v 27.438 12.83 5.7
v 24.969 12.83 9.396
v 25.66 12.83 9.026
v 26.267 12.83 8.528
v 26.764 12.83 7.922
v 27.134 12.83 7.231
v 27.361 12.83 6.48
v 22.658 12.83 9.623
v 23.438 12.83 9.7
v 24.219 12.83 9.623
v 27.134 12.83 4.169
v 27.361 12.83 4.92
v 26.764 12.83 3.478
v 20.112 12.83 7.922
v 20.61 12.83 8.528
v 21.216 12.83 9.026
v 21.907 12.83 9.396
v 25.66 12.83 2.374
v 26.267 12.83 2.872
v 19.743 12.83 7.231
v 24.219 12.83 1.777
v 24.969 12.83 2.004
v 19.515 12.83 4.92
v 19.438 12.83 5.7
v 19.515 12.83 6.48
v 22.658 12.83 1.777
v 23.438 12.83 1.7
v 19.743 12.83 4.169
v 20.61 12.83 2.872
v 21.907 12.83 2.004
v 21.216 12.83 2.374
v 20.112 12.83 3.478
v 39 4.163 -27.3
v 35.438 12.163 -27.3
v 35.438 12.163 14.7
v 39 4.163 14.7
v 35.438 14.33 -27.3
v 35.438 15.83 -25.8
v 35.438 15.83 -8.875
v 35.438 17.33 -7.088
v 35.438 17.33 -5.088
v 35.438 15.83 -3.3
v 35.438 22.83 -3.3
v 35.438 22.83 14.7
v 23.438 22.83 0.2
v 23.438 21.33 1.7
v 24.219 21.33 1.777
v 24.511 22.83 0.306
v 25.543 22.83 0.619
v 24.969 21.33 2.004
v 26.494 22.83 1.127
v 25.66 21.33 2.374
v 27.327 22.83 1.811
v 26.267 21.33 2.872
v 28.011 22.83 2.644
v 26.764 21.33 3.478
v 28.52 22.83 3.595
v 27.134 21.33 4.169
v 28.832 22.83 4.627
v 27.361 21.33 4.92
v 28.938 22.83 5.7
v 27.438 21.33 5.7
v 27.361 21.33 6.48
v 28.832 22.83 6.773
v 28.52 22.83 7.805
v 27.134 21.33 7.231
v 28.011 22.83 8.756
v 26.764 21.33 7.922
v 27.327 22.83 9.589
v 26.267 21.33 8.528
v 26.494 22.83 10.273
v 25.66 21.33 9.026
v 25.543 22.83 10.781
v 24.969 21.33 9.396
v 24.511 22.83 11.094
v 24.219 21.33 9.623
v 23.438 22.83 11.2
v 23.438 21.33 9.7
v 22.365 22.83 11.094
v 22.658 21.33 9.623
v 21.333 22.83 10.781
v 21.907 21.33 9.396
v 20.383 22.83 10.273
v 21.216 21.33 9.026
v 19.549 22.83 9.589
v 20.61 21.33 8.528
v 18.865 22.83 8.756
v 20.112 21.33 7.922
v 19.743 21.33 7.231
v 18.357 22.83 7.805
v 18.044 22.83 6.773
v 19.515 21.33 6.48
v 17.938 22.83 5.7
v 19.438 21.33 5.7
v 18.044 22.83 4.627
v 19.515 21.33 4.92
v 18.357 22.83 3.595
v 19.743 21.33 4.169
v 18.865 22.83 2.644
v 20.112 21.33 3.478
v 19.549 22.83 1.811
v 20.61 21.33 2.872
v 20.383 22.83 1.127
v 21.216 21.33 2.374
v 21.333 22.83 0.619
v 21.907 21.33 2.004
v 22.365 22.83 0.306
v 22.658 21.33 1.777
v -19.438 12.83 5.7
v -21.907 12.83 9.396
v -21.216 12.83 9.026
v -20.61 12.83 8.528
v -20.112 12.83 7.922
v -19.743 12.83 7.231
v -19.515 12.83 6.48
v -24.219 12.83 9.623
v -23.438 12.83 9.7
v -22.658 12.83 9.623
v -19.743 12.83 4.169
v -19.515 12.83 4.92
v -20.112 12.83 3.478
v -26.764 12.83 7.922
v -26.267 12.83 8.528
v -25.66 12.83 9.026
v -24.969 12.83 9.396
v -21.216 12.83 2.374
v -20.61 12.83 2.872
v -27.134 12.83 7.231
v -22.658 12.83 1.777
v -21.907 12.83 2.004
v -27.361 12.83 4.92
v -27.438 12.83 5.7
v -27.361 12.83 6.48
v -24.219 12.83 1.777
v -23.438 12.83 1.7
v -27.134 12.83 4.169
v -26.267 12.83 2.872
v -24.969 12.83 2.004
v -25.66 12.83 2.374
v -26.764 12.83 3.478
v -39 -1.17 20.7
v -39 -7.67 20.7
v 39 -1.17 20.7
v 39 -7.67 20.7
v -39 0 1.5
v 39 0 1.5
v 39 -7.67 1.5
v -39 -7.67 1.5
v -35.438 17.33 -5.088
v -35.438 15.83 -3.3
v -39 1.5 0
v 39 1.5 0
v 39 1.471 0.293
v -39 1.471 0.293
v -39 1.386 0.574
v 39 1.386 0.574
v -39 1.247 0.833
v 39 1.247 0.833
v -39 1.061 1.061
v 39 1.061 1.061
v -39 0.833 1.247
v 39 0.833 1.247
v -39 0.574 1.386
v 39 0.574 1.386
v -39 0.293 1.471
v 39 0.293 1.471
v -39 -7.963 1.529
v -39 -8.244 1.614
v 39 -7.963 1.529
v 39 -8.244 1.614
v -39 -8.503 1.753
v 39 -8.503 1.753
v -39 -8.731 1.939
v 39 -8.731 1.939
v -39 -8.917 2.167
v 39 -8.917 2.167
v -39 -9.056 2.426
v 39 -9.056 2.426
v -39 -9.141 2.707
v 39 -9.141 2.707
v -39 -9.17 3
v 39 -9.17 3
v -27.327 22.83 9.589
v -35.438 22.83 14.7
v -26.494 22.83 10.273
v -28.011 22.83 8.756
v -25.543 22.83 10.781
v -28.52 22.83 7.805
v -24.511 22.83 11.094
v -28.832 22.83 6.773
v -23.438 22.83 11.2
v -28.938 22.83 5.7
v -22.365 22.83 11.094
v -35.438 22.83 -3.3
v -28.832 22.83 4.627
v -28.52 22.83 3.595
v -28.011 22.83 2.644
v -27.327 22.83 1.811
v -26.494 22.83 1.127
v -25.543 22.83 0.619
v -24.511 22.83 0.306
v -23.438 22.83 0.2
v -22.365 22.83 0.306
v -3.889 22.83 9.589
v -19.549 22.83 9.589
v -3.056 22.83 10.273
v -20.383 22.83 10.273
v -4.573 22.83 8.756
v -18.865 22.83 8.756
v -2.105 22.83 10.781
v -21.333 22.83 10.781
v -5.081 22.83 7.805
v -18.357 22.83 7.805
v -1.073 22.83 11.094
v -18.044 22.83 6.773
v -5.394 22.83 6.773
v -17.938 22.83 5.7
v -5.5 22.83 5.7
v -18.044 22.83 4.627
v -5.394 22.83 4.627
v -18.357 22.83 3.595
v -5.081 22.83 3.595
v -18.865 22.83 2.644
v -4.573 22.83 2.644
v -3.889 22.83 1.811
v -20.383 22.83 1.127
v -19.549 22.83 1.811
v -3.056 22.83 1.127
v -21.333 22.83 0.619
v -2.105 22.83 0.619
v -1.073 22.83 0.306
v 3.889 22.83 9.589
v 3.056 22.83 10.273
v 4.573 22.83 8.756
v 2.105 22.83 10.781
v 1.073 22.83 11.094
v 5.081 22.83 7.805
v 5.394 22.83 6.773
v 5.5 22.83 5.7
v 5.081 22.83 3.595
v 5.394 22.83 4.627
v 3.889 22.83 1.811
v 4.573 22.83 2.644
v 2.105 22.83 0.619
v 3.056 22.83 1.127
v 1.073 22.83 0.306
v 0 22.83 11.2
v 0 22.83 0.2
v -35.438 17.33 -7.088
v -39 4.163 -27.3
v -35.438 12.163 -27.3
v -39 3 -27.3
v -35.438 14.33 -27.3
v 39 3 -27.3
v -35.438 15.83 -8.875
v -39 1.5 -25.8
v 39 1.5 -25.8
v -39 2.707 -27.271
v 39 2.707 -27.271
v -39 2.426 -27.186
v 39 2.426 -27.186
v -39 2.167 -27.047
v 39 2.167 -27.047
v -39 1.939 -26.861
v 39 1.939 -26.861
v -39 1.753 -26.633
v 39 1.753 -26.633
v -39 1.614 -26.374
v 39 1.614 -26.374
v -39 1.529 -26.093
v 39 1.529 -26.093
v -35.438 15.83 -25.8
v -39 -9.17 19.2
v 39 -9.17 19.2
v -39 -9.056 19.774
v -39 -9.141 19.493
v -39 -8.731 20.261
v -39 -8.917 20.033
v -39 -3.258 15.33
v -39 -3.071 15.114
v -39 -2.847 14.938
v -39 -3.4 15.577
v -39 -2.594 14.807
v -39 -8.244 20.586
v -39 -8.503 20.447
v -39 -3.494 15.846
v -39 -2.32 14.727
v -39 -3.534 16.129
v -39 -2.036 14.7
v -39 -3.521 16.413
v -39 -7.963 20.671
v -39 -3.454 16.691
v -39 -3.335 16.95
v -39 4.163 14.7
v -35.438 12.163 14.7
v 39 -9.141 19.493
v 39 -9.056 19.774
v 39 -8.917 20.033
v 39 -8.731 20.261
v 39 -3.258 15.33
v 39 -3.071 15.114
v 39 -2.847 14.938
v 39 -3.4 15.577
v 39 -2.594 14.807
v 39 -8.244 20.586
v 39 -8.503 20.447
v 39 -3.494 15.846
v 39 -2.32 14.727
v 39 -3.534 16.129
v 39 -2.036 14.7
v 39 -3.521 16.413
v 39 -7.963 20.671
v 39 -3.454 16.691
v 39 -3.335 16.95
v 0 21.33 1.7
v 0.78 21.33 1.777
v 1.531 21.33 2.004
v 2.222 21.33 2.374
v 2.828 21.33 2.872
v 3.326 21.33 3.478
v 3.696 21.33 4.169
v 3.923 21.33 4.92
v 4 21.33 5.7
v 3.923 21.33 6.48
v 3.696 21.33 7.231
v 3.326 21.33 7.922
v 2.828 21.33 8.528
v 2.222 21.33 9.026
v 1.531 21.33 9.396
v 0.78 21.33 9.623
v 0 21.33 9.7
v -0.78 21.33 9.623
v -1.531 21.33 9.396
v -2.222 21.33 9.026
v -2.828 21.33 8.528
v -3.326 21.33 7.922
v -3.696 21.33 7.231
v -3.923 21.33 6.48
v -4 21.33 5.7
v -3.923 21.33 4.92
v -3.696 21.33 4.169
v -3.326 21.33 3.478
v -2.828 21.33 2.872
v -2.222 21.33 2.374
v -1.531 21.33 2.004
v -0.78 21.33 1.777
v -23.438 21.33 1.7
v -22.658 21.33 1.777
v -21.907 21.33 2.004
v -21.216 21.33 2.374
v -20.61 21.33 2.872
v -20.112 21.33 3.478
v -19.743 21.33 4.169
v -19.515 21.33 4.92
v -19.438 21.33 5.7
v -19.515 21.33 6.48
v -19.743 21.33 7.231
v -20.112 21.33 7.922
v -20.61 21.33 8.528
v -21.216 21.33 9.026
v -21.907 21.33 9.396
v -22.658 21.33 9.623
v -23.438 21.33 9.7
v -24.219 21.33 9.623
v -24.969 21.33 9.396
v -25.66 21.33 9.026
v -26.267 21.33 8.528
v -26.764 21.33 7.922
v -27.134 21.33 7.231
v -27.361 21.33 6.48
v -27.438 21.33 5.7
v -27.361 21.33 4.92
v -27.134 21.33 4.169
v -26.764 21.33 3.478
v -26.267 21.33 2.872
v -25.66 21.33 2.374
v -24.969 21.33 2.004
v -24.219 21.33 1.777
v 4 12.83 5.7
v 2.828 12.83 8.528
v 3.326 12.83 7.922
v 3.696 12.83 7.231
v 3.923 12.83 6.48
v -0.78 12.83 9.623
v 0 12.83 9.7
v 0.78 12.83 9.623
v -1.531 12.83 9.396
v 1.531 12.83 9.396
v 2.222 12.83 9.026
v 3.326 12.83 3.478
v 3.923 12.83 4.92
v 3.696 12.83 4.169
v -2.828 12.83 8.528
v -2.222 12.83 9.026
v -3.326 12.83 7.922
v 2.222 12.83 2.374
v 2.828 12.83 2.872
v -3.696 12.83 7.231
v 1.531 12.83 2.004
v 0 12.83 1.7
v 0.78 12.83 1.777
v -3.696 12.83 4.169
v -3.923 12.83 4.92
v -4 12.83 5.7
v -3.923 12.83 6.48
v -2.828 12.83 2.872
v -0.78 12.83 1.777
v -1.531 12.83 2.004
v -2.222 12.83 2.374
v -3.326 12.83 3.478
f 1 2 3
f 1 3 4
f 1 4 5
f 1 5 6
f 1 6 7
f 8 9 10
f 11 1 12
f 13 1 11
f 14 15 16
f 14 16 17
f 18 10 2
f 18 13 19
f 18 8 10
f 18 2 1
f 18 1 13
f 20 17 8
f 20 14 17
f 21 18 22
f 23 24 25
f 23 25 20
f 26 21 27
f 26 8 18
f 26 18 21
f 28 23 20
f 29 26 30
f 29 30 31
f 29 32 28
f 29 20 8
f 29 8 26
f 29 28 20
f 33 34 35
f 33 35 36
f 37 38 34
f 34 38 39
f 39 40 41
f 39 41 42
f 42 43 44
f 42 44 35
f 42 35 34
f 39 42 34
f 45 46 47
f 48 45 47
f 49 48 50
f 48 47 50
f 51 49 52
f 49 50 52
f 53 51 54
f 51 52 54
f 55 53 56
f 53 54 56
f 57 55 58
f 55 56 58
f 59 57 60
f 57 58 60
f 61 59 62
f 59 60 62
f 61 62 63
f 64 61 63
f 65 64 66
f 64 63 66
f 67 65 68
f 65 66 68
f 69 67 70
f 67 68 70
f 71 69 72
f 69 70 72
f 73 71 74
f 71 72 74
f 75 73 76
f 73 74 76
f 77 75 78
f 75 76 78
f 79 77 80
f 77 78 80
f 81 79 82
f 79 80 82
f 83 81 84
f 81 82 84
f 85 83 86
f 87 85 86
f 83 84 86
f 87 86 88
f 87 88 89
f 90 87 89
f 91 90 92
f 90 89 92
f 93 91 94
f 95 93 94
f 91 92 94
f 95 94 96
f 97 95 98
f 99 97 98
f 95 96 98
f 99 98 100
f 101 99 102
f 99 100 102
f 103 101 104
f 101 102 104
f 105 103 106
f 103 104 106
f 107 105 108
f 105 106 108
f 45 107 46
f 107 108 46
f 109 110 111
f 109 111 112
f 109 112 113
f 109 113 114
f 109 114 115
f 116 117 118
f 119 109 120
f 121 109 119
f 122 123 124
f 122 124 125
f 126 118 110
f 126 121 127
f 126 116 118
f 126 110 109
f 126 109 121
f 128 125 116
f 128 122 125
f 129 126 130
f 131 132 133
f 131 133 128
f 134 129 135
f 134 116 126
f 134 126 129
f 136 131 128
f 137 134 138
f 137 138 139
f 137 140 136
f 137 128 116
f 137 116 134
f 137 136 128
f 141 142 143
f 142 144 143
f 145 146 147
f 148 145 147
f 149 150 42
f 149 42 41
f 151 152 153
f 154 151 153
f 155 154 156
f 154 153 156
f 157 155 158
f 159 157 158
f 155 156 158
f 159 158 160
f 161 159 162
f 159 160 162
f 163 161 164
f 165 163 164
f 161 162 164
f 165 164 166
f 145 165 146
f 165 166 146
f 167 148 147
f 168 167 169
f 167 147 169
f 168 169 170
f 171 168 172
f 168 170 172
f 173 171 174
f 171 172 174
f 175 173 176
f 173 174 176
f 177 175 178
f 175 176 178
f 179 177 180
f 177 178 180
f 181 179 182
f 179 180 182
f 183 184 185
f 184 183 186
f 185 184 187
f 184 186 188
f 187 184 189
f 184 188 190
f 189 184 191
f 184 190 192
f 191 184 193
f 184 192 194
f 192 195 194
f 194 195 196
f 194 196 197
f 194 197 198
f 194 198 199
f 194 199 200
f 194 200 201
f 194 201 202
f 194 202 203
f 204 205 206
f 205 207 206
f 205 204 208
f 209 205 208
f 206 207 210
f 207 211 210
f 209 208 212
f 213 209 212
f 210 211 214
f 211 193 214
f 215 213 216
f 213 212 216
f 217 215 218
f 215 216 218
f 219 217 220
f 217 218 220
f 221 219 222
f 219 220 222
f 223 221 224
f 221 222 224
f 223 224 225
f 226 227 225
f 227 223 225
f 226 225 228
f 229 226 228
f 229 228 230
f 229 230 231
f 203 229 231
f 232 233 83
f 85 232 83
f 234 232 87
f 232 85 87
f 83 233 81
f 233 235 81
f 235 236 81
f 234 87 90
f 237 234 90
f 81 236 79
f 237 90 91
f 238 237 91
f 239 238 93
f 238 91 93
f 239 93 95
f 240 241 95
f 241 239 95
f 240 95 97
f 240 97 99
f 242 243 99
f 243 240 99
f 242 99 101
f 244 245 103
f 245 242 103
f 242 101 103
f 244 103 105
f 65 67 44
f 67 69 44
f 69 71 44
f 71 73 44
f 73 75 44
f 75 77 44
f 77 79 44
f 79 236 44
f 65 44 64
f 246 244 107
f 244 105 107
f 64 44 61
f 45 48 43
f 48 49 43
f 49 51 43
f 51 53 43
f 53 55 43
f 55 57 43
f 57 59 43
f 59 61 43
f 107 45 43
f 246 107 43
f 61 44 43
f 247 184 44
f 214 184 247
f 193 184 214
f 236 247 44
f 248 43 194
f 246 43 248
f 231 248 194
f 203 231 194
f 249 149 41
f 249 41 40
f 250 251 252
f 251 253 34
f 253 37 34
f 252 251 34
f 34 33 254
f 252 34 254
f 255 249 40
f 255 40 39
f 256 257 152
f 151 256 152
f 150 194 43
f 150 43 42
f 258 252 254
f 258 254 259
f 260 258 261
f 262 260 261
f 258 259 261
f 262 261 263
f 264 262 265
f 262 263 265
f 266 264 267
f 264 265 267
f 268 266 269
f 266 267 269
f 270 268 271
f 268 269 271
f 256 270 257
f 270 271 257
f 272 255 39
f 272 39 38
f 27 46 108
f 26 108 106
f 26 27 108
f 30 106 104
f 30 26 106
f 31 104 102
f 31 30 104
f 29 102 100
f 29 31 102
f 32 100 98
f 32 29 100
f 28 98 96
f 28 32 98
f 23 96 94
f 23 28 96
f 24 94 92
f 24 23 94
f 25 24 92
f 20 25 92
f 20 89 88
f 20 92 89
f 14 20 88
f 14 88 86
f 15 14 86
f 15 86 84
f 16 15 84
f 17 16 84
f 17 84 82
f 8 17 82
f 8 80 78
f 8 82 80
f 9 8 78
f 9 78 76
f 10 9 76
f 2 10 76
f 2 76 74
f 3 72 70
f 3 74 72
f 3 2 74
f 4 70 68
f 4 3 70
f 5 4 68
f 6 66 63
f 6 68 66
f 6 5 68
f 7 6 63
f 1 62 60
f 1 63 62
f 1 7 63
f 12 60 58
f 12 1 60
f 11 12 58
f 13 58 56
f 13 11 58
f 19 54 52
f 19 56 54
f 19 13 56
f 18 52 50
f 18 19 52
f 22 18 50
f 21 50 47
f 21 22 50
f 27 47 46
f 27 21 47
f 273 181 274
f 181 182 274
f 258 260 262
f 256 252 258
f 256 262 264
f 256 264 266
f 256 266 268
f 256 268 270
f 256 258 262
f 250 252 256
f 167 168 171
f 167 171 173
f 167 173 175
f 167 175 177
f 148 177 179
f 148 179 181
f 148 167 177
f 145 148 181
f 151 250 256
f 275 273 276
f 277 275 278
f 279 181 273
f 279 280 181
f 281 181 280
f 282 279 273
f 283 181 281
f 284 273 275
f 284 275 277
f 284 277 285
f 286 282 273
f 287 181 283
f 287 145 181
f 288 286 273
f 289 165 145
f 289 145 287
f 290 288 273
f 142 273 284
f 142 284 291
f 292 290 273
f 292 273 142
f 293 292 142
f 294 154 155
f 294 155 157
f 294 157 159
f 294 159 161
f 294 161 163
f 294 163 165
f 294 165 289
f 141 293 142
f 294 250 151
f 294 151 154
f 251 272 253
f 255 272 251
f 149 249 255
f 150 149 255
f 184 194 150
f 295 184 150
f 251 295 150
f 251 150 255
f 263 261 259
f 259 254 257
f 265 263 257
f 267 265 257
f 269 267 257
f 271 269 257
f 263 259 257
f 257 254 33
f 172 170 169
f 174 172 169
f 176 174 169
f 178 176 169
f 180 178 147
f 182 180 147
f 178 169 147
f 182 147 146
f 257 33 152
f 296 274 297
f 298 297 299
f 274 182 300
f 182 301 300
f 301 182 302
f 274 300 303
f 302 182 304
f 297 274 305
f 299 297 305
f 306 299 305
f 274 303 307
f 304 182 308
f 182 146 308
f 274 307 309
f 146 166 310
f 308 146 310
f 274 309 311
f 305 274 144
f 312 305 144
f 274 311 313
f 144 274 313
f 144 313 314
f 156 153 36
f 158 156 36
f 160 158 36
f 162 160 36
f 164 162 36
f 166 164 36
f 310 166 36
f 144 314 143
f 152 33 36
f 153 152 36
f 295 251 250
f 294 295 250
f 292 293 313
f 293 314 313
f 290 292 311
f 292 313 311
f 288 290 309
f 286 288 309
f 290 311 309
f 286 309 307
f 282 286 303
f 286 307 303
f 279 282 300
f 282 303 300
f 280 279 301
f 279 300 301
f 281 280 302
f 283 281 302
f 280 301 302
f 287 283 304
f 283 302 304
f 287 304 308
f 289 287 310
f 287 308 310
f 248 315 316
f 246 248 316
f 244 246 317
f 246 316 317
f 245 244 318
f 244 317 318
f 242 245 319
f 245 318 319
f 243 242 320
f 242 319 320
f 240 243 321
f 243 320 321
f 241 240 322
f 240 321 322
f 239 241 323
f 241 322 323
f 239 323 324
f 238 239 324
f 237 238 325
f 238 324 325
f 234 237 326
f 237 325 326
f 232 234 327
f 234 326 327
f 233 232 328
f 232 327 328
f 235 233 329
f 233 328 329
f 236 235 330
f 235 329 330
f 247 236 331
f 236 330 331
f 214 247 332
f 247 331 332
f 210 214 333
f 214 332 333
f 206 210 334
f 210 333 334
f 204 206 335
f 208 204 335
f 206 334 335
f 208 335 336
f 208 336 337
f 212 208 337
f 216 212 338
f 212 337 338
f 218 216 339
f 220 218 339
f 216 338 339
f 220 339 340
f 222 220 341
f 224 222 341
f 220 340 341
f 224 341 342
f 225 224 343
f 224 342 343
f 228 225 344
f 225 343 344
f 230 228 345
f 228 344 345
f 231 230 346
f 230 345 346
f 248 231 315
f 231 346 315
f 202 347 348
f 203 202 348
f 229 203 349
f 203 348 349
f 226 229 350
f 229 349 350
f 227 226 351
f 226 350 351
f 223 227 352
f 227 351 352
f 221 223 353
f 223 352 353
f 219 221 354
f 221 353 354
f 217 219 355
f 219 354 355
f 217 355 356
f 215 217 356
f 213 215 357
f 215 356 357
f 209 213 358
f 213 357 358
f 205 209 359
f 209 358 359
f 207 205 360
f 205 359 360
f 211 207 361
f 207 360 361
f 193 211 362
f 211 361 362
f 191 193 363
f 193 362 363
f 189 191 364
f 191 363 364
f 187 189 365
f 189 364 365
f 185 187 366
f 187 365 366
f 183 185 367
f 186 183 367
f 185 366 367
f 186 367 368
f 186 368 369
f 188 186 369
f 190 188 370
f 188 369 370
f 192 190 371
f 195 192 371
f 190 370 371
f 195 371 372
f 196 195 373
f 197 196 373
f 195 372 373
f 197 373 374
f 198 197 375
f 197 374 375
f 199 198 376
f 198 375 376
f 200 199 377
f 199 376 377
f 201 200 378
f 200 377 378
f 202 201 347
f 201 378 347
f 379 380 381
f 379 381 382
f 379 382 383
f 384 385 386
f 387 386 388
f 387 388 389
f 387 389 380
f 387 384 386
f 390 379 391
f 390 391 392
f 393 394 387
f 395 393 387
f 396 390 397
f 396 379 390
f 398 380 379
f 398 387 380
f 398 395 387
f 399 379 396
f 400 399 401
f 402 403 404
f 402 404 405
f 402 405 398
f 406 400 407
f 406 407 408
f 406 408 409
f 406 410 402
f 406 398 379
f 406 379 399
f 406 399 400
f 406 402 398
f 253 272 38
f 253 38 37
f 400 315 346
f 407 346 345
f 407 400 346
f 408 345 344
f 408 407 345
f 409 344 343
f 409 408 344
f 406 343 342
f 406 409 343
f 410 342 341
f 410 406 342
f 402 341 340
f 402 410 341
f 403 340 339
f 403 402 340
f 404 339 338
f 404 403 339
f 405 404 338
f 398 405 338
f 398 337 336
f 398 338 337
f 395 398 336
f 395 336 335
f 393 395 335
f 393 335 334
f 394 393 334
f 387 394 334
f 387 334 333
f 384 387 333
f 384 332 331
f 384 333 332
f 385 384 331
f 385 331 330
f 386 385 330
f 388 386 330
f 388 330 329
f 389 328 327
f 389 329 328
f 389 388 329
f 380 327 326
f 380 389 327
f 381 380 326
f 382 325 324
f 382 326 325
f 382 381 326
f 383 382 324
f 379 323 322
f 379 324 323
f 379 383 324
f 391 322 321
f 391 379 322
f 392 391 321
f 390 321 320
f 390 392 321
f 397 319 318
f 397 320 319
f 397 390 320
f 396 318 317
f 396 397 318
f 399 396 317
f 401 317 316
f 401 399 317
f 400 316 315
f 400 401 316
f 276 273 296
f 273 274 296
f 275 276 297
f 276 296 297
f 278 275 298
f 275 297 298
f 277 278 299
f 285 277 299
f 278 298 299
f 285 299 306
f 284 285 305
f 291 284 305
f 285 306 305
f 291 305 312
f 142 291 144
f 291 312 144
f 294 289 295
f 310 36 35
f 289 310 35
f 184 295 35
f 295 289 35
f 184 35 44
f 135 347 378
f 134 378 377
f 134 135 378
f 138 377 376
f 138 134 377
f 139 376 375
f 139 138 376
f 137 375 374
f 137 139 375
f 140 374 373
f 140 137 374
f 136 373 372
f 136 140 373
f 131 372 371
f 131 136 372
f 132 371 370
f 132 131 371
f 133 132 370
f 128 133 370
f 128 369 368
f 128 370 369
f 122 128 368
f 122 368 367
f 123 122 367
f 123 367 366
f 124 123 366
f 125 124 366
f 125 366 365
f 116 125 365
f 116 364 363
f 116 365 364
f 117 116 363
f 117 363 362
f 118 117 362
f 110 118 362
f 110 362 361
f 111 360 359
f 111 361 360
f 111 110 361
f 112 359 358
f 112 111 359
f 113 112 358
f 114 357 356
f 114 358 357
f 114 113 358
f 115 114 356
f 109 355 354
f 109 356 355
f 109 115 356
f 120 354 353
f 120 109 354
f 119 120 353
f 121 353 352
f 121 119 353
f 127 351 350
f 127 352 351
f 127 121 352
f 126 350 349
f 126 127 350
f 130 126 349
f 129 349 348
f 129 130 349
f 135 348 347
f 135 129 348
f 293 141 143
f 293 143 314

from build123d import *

# Parameters (mm, degrees)
BOSS_EXTRUDE1_DEPTH     = 39
CUT_EXTRUDE1_DEPTH      = 53.796769788
CUT_EXTRUDE2_DEPTH      = 58.361049502
CUT_EXTRUDE2_DEPTH_BACK = 10
SKETCH3_R               = 4
CHAMFER1_SIZE           = 1.5


with BuildPart() as part:
    # Sketch1 → Boss-Extrude1 (new, symmetric)
    with BuildSketch(Plane(origin=(0, 0, 0), x_dir=(0, 0, -1), z_dir=(1, 0, 0))):
        with BuildLine():
            Line((-1.5, 0), (-1.5, -7.67))
            ThreePointArc((-1.5, -7.67), (-1.939339828, -8.730660172), (-3, -9.17))
            Line((-3, -9.17), (-19.2, -9.17))
            ThreePointArc((-19.2, -9.17), (-20.260660172, -8.730660172), (-20.7, -7.67))
            Line((-20.7, -7.67), (-20.7, -1.17))
            Line((-20.7, -1.17), (-16.95, -3.335063509))
            ThreePointArc((-16.95, -3.335063509), (-15.45, -3.335063509), (-14.7, -2.036025404))
            Line((-14.7, -2.036025404), (-14.7, 22.83))
            Line((-14.7, 22.83), (3.3, 22.83))
            Line((3.3, 22.83), (3.3, 15.83))
            Line((3.3, 15.83), (5.087630389, 17.33))
            Line((5.087630389, 17.33), (7.087630389, 17.33))
            Line((7.087630389, 17.33), (8.875260778, 15.83))
            Line((8.875260778, 15.83), (25.8, 15.83))
            Line((25.8, 15.83), (27.3, 14.33))
            Line((27.3, 14.33), (27.3, 3))
            ThreePointArc((27.3, 3), (26.860660172, 1.939339828), (25.8, 1.5))
            Line((25.8, 1.5), (0, 1.5))
            ThreePointArc((0, 1.5), (-1.060660172, 1.060660172), (-1.5, 0))
        make_face()
    extrude(amount=BOSS_EXTRUDE1_DEPTH, both=True)

    # Sketch2 → Cut-Extrude1 (cut, symmetric)
    with BuildSketch(Plane.XY):
        Polygon((-39, 22.83), (-35.438170518, 22.83), (-35.438170518, 12.163333333), (-39, 4.163333333), align=None)
    cut_extrude1 = extrude(amount=CUT_EXTRUDE1_DEPTH, both=True, mode=Mode.SUBTRACT)

    # Mirror2: Cut-Extrude1 across plane
    add(cut_extrude1.mirror(Plane(origin=(0, 0, 0), x_dir=(0, 0, 1), z_dir=(1, 0, 0))), mode=Mode.SUBTRACT)

    # Sketch3 → Cut-Extrude2 (cut, two sides: drawn at the far end of the back side and taken through both)
    with BuildSketch(Plane(origin=(0, 22.83, 0), x_dir=(1, 0, 0), z_dir=(0, 1, 0)).offset(-CUT_EXTRUDE2_DEPTH_BACK)):
        with Locations(Location((23.438170518, -5.7, 0), (0, 0, 90))):
            Circle(SKETCH3_R)
        with Locations(Location((0, -5.7, 0), (0, 0, 90))):
            Circle(SKETCH3_R)
        with Locations(Location((-23.438170518, -5.7, 0), (0, 0, 90))):
            Circle(SKETCH3_R)
    extrude(amount=CUT_EXTRUDE2_DEPTH + CUT_EXTRUDE2_DEPTH_BACK, mode=Mode.SUBTRACT)

    # Chamfer1
    chamfer1_edges = [part.edges().sort_by_distance(p)[0] for p in [
        (23.438170518, 22.83, 9.7),
        (0, 22.83, 9.7),
        (-23.438170518, 22.83, 9.7),
    ]]
    chamfer(chamfer1_edges, length=CHAMFER1_SIZE)


solid = part.part
